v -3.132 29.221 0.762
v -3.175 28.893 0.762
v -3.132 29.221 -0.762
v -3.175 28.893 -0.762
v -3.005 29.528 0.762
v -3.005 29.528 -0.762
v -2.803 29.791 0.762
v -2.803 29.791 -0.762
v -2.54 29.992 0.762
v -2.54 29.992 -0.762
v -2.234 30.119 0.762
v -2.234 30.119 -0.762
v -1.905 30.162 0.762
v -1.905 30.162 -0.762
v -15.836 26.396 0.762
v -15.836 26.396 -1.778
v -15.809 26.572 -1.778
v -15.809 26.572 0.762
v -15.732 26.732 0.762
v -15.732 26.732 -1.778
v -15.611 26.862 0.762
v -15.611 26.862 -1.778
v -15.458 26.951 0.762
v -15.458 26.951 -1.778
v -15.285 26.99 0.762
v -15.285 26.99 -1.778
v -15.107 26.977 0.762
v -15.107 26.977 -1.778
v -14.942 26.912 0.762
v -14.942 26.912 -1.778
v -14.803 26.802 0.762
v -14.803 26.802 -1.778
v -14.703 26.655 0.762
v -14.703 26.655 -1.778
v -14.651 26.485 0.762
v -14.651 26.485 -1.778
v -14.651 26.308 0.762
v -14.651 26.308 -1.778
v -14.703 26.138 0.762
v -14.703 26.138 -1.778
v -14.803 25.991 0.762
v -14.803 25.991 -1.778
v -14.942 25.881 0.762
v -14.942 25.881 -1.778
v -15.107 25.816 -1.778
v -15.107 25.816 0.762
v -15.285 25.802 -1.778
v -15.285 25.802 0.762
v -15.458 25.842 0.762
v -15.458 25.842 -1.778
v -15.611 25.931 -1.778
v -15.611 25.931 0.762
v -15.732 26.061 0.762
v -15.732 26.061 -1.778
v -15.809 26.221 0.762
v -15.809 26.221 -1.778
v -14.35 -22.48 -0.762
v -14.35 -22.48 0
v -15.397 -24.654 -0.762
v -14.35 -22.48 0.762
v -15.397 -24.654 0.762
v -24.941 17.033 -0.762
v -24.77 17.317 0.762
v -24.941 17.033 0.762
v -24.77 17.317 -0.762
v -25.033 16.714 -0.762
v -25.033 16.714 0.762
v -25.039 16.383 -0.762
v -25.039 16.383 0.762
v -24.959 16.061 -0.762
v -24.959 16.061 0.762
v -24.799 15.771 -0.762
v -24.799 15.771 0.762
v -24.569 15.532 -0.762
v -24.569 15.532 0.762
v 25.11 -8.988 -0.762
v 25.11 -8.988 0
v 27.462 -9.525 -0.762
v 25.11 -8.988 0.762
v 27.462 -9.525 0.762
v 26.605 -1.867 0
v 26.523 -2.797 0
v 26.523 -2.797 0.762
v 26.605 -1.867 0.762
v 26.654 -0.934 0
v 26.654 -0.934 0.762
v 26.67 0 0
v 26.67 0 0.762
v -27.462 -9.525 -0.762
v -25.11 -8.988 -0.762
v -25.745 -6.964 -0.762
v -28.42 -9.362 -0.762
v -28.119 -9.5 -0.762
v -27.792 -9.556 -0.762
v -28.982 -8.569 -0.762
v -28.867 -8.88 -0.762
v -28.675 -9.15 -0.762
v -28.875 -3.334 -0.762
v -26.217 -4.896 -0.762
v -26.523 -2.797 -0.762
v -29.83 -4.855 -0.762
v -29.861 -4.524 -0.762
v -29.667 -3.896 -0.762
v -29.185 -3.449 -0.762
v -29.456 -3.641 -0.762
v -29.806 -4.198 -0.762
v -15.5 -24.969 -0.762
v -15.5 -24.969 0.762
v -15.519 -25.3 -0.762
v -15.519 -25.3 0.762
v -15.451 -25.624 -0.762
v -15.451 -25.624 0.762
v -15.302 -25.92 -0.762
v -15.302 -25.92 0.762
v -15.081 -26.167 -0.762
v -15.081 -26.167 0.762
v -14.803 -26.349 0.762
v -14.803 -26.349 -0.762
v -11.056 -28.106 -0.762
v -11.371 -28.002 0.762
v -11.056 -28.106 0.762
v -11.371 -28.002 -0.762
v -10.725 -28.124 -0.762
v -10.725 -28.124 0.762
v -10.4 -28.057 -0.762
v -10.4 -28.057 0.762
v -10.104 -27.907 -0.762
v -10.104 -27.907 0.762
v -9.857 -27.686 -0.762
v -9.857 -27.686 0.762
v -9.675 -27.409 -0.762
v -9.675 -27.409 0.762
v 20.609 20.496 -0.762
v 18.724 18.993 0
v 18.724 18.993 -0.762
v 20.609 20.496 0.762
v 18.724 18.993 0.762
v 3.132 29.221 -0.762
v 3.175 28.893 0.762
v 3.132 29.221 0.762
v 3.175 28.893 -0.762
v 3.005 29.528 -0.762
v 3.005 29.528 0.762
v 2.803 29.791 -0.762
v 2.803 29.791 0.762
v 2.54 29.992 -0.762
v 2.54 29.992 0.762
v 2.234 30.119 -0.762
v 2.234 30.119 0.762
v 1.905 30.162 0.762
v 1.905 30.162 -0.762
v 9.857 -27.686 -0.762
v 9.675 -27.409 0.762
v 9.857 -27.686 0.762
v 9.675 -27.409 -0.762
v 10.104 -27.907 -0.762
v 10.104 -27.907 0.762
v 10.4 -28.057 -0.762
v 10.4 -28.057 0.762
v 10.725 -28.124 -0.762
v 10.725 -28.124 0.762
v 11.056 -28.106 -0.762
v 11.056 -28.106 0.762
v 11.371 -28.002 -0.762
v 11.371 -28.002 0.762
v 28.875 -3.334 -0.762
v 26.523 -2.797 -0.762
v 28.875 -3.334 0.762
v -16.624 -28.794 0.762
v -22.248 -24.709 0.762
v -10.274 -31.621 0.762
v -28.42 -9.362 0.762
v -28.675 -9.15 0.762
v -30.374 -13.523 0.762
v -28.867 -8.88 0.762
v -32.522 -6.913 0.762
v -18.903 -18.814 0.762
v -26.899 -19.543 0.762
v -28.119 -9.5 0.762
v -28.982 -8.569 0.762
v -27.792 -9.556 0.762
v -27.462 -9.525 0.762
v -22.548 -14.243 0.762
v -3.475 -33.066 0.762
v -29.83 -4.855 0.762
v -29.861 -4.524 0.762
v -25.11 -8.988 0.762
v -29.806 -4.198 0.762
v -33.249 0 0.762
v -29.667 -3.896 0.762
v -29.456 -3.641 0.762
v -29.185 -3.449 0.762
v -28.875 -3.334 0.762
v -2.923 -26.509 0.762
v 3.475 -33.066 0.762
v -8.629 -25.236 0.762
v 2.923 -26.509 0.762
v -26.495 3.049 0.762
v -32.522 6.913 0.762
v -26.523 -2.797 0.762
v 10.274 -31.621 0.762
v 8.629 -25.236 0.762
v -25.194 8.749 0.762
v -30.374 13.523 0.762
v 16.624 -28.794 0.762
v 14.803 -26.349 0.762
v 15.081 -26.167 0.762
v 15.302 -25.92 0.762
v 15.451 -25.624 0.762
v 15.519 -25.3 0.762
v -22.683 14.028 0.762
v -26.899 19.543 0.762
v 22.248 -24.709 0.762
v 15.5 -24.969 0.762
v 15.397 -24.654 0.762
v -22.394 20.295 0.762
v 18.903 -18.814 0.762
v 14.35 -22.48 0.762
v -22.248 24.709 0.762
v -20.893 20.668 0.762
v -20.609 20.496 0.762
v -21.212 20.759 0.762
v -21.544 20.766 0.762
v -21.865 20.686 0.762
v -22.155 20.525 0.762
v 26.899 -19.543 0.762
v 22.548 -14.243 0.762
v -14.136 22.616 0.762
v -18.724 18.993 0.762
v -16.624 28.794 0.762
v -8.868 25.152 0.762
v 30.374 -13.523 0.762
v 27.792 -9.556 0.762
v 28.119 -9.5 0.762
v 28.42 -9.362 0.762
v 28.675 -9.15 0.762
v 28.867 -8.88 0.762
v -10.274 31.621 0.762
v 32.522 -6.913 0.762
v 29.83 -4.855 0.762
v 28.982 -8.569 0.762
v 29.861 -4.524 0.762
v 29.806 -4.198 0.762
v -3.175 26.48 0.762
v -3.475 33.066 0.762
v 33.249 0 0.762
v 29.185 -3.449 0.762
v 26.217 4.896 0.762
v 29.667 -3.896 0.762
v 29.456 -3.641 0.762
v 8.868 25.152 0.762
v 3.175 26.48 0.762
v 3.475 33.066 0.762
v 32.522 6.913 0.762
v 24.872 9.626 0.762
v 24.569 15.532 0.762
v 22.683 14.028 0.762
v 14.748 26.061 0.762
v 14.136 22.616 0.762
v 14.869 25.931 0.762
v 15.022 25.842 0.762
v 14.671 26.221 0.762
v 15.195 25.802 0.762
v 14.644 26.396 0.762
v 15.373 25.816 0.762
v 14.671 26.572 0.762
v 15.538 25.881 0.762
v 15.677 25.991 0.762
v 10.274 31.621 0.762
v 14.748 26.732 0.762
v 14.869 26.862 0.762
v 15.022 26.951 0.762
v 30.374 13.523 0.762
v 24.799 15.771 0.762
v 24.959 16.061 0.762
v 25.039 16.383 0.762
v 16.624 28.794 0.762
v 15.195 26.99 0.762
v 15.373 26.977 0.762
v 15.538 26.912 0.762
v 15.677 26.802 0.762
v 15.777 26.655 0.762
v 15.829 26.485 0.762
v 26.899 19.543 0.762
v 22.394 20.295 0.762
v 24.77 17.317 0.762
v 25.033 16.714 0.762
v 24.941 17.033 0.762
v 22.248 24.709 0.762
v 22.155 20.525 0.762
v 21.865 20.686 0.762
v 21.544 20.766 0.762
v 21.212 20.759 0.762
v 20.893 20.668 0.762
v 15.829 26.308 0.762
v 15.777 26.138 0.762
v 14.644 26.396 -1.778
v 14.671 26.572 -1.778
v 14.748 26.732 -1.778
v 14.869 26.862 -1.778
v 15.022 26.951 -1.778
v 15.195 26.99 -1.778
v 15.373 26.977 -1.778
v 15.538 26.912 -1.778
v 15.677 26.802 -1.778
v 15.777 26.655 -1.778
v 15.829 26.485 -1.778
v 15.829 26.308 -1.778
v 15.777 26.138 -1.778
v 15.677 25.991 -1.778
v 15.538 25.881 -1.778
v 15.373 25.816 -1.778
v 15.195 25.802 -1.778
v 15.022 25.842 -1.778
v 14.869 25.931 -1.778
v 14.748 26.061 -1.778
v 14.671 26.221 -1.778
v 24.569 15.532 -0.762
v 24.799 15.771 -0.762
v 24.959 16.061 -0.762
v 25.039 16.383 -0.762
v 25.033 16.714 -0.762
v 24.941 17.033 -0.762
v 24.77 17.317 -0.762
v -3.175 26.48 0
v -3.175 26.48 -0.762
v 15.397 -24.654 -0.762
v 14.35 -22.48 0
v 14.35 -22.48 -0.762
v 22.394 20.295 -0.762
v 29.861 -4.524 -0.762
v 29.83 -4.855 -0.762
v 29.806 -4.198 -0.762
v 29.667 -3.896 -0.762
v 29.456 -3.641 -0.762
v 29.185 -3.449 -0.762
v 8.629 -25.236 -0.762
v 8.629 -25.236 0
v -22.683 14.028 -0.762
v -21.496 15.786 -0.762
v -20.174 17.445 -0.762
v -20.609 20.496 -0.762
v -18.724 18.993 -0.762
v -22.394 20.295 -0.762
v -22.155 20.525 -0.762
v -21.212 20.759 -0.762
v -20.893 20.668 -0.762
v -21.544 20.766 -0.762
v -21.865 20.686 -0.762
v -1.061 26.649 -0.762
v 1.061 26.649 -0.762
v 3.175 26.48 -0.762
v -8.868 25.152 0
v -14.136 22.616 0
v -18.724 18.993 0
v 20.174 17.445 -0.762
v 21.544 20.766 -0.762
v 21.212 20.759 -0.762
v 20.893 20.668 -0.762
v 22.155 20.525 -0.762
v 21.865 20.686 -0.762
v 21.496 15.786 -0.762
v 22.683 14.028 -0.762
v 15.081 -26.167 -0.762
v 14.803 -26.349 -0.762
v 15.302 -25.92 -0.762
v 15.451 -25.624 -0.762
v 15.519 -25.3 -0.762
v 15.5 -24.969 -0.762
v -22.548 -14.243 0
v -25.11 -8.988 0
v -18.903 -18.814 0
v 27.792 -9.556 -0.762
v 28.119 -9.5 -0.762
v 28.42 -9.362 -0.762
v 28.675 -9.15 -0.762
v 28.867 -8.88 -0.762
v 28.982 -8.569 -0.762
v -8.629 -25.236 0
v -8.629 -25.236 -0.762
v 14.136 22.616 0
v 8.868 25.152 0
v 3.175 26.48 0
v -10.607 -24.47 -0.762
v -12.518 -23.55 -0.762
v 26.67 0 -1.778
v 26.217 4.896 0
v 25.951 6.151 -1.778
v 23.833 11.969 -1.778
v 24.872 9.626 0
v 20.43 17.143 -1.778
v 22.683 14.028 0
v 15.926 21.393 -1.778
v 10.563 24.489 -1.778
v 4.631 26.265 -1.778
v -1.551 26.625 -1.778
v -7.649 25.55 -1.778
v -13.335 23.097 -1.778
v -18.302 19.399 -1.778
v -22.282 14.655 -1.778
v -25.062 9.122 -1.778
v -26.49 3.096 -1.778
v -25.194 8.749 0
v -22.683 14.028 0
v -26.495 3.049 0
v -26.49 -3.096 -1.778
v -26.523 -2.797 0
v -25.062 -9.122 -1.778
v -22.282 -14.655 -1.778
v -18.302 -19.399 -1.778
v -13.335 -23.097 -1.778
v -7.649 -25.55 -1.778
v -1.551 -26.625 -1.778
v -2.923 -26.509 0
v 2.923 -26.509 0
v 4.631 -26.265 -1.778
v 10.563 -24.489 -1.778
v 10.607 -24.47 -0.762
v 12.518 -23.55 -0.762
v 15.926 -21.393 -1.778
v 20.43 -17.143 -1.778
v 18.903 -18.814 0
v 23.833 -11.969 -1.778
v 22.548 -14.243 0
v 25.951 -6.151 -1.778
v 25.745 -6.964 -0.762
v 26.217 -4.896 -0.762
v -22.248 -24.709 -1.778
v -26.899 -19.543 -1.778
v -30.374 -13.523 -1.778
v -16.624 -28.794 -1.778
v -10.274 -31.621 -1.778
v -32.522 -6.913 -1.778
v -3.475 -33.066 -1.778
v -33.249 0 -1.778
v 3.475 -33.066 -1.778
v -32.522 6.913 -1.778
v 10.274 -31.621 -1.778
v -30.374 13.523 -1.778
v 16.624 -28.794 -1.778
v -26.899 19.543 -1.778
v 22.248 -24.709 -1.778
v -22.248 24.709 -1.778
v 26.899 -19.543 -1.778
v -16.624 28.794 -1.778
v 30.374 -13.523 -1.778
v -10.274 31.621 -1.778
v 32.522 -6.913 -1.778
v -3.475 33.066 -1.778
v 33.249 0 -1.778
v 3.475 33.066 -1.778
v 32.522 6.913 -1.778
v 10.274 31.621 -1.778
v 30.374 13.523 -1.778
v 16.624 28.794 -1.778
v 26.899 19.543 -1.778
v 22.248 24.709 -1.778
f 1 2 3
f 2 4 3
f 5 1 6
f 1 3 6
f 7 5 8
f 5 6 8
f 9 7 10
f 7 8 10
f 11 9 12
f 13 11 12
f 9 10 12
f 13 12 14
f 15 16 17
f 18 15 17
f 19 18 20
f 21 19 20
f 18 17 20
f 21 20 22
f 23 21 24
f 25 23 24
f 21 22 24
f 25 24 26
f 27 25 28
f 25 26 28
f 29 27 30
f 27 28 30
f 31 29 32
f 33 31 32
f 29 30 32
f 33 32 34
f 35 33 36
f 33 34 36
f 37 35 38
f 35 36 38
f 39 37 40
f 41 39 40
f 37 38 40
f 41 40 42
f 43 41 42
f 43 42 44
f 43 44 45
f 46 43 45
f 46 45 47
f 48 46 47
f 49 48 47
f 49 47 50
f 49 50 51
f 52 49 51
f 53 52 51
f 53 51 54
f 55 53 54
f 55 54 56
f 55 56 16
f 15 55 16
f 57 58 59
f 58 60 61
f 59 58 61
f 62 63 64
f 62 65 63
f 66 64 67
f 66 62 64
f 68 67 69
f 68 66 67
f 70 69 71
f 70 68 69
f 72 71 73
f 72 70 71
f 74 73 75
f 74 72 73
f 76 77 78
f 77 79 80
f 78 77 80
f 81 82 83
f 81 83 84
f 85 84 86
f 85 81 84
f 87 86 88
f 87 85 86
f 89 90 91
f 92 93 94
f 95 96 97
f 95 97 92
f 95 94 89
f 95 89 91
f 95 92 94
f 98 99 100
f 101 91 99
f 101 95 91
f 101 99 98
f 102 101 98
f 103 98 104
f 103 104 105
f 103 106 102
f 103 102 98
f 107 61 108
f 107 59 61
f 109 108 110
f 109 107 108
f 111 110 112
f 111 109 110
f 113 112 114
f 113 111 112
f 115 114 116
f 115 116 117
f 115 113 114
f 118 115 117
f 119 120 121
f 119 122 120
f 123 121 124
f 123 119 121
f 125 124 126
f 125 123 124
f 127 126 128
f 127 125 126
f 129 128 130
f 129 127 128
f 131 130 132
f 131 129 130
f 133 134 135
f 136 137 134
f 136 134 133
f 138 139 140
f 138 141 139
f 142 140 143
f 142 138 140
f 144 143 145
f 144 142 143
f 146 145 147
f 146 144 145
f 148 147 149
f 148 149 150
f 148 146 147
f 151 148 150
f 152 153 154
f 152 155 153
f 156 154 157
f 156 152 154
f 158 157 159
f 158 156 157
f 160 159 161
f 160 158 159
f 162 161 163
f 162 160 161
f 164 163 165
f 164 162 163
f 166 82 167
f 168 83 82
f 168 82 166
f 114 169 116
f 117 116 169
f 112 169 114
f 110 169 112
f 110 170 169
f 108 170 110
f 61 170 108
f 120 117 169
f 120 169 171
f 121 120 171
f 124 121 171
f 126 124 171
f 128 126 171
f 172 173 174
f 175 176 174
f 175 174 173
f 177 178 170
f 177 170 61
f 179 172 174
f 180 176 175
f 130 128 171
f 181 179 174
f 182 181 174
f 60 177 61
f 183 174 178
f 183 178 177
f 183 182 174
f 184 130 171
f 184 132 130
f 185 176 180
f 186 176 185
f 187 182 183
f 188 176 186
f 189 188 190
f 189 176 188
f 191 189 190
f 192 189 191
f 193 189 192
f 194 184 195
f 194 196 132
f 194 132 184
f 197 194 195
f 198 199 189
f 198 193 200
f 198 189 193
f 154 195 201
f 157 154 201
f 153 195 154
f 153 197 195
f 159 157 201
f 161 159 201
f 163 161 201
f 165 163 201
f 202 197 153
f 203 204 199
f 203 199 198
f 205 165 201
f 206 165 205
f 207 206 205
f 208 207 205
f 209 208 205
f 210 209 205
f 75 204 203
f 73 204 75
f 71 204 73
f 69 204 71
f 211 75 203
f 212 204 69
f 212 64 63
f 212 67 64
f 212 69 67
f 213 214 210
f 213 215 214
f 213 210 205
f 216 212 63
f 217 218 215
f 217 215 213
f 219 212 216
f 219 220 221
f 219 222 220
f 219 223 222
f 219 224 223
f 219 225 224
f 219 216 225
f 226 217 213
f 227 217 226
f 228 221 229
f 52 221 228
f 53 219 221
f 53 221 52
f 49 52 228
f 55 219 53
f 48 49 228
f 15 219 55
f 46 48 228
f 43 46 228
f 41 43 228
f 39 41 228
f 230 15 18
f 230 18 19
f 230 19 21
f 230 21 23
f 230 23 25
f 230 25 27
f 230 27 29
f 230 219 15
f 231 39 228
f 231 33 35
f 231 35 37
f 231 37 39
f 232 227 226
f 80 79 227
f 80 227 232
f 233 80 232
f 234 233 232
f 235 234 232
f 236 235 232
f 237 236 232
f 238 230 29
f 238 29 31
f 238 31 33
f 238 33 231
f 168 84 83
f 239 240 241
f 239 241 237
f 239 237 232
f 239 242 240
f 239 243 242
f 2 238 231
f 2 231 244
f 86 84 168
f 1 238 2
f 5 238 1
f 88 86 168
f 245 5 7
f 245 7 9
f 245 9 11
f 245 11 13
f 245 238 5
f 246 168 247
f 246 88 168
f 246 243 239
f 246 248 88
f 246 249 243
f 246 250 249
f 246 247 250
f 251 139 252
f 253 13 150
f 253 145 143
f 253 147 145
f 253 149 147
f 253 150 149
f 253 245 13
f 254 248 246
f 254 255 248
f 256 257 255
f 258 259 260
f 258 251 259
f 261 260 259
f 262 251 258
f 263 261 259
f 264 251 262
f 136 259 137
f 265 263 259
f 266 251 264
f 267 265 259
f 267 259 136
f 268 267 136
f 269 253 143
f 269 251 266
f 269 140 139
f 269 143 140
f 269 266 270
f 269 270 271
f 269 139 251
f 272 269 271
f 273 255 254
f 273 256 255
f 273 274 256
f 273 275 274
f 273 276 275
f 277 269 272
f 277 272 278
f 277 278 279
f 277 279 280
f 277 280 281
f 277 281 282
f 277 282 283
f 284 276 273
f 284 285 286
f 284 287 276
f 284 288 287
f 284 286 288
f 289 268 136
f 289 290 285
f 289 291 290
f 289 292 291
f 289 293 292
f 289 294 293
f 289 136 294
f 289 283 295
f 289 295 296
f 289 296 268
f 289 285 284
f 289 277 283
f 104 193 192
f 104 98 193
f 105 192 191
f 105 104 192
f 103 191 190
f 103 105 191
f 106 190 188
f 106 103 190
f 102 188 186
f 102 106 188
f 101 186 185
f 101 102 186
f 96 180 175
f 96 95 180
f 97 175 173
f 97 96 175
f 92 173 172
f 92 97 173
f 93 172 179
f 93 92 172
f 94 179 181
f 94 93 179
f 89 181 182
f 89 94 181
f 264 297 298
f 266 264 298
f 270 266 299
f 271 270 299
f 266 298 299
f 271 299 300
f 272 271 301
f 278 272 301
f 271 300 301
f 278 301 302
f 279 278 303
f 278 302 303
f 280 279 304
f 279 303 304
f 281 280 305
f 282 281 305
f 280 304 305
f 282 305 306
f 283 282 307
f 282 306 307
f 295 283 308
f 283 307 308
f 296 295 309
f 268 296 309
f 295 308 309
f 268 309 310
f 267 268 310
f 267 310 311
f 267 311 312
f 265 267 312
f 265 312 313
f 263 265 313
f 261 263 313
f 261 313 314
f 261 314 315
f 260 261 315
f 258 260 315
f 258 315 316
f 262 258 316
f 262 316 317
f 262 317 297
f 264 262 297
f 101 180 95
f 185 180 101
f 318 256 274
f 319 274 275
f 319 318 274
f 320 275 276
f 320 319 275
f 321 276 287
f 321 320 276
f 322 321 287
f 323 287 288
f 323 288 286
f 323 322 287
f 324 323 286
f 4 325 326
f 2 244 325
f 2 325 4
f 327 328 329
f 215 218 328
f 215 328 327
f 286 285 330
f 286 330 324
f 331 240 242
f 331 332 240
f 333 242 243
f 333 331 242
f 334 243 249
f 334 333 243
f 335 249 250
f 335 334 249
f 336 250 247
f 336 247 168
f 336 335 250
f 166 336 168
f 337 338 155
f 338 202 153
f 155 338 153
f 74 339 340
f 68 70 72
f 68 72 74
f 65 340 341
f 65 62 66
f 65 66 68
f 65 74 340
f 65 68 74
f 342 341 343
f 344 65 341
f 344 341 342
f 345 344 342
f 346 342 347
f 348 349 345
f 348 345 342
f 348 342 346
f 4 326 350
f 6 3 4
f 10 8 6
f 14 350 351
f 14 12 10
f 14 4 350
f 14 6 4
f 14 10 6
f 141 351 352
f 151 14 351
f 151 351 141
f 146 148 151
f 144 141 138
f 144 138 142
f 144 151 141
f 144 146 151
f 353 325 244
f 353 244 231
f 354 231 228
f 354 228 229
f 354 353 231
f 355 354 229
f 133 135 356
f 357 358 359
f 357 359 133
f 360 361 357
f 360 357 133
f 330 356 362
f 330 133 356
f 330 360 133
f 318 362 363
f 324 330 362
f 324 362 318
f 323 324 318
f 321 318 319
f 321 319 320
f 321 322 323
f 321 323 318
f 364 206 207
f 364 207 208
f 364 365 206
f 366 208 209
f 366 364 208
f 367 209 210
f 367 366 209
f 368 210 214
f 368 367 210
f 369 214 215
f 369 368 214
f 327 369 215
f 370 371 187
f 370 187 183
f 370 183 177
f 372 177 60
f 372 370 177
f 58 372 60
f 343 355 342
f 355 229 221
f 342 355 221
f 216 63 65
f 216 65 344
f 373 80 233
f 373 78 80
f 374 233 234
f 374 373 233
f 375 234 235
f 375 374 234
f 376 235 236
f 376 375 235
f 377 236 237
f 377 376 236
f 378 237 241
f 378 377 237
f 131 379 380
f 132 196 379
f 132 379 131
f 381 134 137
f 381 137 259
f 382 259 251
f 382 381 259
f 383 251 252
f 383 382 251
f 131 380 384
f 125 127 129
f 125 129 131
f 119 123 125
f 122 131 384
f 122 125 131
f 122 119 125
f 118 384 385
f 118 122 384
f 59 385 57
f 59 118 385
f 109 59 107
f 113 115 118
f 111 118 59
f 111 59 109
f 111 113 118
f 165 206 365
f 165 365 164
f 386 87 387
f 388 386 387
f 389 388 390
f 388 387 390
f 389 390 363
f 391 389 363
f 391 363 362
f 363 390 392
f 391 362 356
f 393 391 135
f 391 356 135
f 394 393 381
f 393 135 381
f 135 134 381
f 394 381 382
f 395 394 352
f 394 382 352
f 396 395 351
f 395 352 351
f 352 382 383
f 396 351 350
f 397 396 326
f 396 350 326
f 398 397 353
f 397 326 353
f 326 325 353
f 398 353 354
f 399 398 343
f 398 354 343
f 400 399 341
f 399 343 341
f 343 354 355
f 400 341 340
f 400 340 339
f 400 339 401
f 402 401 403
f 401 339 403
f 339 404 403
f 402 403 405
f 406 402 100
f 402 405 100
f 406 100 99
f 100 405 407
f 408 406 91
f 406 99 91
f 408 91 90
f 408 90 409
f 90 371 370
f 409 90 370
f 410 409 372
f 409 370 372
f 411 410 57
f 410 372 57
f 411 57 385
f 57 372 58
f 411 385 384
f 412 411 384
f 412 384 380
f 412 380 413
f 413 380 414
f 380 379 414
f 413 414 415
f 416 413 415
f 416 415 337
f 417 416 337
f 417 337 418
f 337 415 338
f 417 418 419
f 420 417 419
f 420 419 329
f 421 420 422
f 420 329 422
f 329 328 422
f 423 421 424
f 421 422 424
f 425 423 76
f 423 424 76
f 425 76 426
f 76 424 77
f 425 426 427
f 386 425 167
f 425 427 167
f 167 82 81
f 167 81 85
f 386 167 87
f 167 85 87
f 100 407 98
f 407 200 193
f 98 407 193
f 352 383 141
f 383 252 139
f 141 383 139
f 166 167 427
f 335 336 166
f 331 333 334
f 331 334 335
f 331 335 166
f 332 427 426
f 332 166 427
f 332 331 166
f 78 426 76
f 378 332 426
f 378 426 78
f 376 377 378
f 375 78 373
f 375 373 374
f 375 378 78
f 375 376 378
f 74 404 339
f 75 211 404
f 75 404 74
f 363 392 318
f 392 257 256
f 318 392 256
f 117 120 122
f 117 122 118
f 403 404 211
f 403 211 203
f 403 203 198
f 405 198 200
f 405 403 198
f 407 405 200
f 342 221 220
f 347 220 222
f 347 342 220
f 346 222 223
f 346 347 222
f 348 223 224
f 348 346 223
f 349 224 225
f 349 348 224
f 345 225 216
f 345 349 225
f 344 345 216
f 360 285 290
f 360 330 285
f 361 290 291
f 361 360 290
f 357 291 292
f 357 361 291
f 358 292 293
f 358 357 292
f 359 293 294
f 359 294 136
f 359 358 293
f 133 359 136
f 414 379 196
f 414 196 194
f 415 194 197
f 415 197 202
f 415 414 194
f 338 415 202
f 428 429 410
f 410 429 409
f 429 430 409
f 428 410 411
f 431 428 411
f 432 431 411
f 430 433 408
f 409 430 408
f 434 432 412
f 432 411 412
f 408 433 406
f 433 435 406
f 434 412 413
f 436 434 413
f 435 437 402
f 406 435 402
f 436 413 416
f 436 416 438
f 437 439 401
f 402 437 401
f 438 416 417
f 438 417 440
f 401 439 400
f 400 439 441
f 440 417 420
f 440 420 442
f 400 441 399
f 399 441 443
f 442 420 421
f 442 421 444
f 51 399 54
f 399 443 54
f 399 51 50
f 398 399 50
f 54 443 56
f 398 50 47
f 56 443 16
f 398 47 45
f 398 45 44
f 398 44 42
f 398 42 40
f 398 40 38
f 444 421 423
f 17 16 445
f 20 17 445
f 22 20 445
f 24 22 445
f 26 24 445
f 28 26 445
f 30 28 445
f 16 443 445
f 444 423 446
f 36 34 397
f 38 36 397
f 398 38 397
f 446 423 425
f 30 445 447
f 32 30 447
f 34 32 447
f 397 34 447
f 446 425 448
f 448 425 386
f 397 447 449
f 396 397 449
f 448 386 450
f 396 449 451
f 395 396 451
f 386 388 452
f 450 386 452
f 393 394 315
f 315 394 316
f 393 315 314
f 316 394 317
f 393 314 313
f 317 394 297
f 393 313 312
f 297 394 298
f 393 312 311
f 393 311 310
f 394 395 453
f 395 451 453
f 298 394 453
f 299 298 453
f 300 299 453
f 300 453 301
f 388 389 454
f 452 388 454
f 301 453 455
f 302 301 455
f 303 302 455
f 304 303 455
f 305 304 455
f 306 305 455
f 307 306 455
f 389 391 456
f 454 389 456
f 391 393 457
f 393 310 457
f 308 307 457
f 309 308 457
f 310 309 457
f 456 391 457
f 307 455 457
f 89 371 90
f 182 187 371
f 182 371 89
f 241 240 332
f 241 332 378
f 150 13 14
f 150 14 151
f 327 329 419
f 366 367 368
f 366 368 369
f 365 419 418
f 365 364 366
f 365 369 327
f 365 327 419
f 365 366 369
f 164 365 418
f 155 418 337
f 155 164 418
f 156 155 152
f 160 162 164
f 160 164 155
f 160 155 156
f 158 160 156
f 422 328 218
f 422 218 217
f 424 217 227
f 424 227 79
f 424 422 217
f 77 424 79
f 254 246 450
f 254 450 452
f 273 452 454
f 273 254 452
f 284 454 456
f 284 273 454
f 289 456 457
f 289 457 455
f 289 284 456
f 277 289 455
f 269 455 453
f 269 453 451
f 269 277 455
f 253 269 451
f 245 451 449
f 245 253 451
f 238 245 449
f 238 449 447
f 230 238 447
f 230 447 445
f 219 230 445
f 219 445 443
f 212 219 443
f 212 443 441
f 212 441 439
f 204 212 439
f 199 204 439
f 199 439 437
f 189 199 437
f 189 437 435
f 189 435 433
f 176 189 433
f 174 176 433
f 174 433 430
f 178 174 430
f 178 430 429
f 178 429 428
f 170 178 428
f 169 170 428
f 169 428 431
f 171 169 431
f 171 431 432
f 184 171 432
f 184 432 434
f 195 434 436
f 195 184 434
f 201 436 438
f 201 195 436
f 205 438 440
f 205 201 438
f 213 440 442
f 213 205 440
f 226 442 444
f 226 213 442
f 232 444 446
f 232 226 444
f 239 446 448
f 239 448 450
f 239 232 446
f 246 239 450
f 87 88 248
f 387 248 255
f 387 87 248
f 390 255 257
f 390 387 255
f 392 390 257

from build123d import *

# Parameters (mm, degrees)
BOSS_EXTRUDE1_DEPTH       = 0.762
BOSS_EXTRUDE1_DEPTH_BACK  = 1.778
SKETCH1_W                 = 74.549
SKETCH1_H                 = 74.549
SKETCH1_R                 = 26.67
SKETCH2_R                 = 3.302
CUT_EXTRUDE1_DEPTH        = 53.775262202
MIRROR2_COPY_1_SKETCH_R   = 3.302
MIRROR2_COPY_1_DEPTH      = 53.775262202
MIRROR2_COPY_2_SKETCH_R   = 3.302
MIRROR2_COPY_2_DEPTH      = 53.775262202
SKETCH14_OUTSIDE_W        = 97.642
SKETCH14_OUTSIDE_H        = 97.642
SKETCH14_OUTSIDE_R        = 33.2486
CUT_EXTRUDE6_DEPTH        = 53.775262202
SKETCH15_W                = 6.35
SKETCH15_H                = 8.89
CUT_EXTRUDE7_DEPTH        = 1.524
FILLET2_R                 = 1.27
CIRPATTERN2_COUNT         = 7
FILLET2_OF_CIRPATTERN2_R  = 1.27
SKETCH16_R                = 0.0127
CUT_EXTRUDE8_DEPTH        = 48.089175018
F_0_80_TAPPED_HOLE3_D     = 1.19126
F_0_80_TAPPED_HOLE3_DEPTH = 4.064
F_0_80_TAPPED_HOLE3_TIP   = 0.357890611


with BuildPart() as part:
    # Sketch1 → Boss-Extrude1 (new, two sides: drawn at the far end of the back side and taken through both)
    with BuildSketch(Plane.XY.offset(-BOSS_EXTRUDE1_DEPTH_BACK)):
        Rectangle(SKETCH1_W, SKETCH1_H)
        Circle(SKETCH1_R, mode=Mode.SUBTRACT)
    extrude(amount=BOSS_EXTRUDE1_DEPTH + BOSS_EXTRUDE1_DEPTH_BACK)

    # Sketch2 → Cut-Extrude1 (cut, through all)
    with BuildSketch(Plane.XY.offset(0.762)):
        with Locations((-31.75, 31.75)):
            Circle(SKETCH2_R)
    cut_extrude1 = extrude(amount=-CUT_EXTRUDE1_DEPTH, mode=Mode.SUBTRACT)

    # Mirror1: Cut-Extrude1 across plane
    add(cut_extrude1.mirror(Plane(origin=(0, 0, 0), x_dir=(0, 0, 1), z_dir=(1, 0, 0))), mode=Mode.SUBTRACT)

    # Mirror2 copy 1 sketch → Mirror2 copy 1 (cut, through all)
    with BuildSketch(Plane(origin=(0, 0, 0.762), x_dir=(-1, 0, 0), z_dir=(0, 0, 1))):
        with Locations((-31.75, 31.75)):
            Circle(MIRROR2_COPY_1_SKETCH_R)
    extrude(amount=-MIRROR2_COPY_1_DEPTH, mode=Mode.SUBTRACT)

    # Mirror2 copy 2 sketch → Mirror2 copy 2 (cut, through all)
    with BuildSketch(Plane.XY.offset(0.762)):
        with Locations((-31.75, -31.75)):
            Circle(MIRROR2_COPY_2_SKETCH_R)
    extrude(amount=-MIRROR2_COPY_2_DEPTH, mode=Mode.SUBTRACT)

    # Sketch14 outside → Cut-Extrude6 (cut, through all)
    with BuildSketch(Plane.XY.offset(0.762)):
        Rectangle(SKETCH14_OUTSIDE_W, SKETCH14_OUTSIDE_H)
        Circle(SKETCH14_OUTSIDE_R, mode=Mode.SUBTRACT)
    extrude(amount=-CUT_EXTRUDE6_DEPTH, mode=Mode.SUBTRACT)

    # Sketch15 → Cut-Extrude7 (cut)
    with BuildSketch(Plane.XY.offset(0.762)):
        with Locations((0, 25.7175)):
            Rectangle(SKETCH15_W, SKETCH15_H)
    cut_extrude7 = extrude(amount=-CUT_EXTRUDE7_DEPTH, mode=Mode.SUBTRACT)

    # Fillet2
    fillet2_edges = [part.edges().sort_by_distance(p)[0] for p in [
        (3.175, 30.1625, 0),
        (-3.175, 30.1625, 0),
    ]]
    fillet(fillet2_edges, radius=FILLET2_R)

    # CirPattern2: Cut-Extrude7 ×7 about axis
    cirpattern2_axis = Axis((0, 0, -1.778), (0, 0, 1))
    for i in range(1, CIRPATTERN2_COUNT):
        add(cut_extrude7.rotate(cirpattern2_axis, i * 360 / CIRPATTERN2_COUNT), mode=Mode.SUBTRACT)

    # Fillet2 of CirPattern2
    fillet2_of_cirpattern2_edges = [part.edges().sort_by_distance(p)[0] for p in [
        (-21.602411969, 21.288326105, 0),
        (-25.561572211, 16.323696192, 0),
        (-30.112767116, -3.616391549, 0),
        (-28.699759186, -9.807183792, 0),
        (-15.947594437, -25.797892606, 0),
        (-10.226442126, -28.55305435, 0),
        (10.226442126, -28.55305435, 0),
        (15.947594437, -25.797892606, 0),
        (28.699759186, -9.807183792, 0),
        (30.112767116, -3.616391549, 0),
        (25.561572211, 16.323696192, 0),
        (21.602411969, 21.288326105, 0),
    ]]
    fillet(fillet2_of_cirpattern2_edges, radius=FILLET2_OF_CIRPATTERN2_R)

    # Sketch16 → Cut-Extrude8 (cut, through all)
    with BuildSketch(Plane.XY.offset(0.762)):
        with Locations((-15.24, 26.396454307)):
            Circle(SKETCH16_R)
    cut_extrude8 = extrude(amount=-CUT_EXTRUDE8_DEPTH, mode=Mode.SUBTRACT)

    # Mirror4: Cut-Extrude8 across plane
    add(cut_extrude8.mirror(Plane(origin=(0, 0, 0), x_dir=(0, 0, 1), z_dir=(1, 0, 0))), mode=Mode.SUBTRACT)

    # 0-80 Tapped Hole3
    with Locations(Plane.XY.offset(0.762)):
        with Locations((-15.24, 26.396454307), (15.24, 26.396454307)):
            Hole(F_0_80_TAPPED_HOLE3_D / 2, depth=F_0_80_TAPPED_HOLE3_DEPTH)
            with Locations((0, 0, -(F_0_80_TAPPED_HOLE3_DEPTH + F_0_80_TAPPED_HOLE3_TIP / 2))):  # 118° drill point
                Cone(0, F_0_80_TAPPED_HOLE3_D / 2, F_0_80_TAPPED_HOLE3_TIP, mode=Mode.SUBTRACT)


solid = part.part
